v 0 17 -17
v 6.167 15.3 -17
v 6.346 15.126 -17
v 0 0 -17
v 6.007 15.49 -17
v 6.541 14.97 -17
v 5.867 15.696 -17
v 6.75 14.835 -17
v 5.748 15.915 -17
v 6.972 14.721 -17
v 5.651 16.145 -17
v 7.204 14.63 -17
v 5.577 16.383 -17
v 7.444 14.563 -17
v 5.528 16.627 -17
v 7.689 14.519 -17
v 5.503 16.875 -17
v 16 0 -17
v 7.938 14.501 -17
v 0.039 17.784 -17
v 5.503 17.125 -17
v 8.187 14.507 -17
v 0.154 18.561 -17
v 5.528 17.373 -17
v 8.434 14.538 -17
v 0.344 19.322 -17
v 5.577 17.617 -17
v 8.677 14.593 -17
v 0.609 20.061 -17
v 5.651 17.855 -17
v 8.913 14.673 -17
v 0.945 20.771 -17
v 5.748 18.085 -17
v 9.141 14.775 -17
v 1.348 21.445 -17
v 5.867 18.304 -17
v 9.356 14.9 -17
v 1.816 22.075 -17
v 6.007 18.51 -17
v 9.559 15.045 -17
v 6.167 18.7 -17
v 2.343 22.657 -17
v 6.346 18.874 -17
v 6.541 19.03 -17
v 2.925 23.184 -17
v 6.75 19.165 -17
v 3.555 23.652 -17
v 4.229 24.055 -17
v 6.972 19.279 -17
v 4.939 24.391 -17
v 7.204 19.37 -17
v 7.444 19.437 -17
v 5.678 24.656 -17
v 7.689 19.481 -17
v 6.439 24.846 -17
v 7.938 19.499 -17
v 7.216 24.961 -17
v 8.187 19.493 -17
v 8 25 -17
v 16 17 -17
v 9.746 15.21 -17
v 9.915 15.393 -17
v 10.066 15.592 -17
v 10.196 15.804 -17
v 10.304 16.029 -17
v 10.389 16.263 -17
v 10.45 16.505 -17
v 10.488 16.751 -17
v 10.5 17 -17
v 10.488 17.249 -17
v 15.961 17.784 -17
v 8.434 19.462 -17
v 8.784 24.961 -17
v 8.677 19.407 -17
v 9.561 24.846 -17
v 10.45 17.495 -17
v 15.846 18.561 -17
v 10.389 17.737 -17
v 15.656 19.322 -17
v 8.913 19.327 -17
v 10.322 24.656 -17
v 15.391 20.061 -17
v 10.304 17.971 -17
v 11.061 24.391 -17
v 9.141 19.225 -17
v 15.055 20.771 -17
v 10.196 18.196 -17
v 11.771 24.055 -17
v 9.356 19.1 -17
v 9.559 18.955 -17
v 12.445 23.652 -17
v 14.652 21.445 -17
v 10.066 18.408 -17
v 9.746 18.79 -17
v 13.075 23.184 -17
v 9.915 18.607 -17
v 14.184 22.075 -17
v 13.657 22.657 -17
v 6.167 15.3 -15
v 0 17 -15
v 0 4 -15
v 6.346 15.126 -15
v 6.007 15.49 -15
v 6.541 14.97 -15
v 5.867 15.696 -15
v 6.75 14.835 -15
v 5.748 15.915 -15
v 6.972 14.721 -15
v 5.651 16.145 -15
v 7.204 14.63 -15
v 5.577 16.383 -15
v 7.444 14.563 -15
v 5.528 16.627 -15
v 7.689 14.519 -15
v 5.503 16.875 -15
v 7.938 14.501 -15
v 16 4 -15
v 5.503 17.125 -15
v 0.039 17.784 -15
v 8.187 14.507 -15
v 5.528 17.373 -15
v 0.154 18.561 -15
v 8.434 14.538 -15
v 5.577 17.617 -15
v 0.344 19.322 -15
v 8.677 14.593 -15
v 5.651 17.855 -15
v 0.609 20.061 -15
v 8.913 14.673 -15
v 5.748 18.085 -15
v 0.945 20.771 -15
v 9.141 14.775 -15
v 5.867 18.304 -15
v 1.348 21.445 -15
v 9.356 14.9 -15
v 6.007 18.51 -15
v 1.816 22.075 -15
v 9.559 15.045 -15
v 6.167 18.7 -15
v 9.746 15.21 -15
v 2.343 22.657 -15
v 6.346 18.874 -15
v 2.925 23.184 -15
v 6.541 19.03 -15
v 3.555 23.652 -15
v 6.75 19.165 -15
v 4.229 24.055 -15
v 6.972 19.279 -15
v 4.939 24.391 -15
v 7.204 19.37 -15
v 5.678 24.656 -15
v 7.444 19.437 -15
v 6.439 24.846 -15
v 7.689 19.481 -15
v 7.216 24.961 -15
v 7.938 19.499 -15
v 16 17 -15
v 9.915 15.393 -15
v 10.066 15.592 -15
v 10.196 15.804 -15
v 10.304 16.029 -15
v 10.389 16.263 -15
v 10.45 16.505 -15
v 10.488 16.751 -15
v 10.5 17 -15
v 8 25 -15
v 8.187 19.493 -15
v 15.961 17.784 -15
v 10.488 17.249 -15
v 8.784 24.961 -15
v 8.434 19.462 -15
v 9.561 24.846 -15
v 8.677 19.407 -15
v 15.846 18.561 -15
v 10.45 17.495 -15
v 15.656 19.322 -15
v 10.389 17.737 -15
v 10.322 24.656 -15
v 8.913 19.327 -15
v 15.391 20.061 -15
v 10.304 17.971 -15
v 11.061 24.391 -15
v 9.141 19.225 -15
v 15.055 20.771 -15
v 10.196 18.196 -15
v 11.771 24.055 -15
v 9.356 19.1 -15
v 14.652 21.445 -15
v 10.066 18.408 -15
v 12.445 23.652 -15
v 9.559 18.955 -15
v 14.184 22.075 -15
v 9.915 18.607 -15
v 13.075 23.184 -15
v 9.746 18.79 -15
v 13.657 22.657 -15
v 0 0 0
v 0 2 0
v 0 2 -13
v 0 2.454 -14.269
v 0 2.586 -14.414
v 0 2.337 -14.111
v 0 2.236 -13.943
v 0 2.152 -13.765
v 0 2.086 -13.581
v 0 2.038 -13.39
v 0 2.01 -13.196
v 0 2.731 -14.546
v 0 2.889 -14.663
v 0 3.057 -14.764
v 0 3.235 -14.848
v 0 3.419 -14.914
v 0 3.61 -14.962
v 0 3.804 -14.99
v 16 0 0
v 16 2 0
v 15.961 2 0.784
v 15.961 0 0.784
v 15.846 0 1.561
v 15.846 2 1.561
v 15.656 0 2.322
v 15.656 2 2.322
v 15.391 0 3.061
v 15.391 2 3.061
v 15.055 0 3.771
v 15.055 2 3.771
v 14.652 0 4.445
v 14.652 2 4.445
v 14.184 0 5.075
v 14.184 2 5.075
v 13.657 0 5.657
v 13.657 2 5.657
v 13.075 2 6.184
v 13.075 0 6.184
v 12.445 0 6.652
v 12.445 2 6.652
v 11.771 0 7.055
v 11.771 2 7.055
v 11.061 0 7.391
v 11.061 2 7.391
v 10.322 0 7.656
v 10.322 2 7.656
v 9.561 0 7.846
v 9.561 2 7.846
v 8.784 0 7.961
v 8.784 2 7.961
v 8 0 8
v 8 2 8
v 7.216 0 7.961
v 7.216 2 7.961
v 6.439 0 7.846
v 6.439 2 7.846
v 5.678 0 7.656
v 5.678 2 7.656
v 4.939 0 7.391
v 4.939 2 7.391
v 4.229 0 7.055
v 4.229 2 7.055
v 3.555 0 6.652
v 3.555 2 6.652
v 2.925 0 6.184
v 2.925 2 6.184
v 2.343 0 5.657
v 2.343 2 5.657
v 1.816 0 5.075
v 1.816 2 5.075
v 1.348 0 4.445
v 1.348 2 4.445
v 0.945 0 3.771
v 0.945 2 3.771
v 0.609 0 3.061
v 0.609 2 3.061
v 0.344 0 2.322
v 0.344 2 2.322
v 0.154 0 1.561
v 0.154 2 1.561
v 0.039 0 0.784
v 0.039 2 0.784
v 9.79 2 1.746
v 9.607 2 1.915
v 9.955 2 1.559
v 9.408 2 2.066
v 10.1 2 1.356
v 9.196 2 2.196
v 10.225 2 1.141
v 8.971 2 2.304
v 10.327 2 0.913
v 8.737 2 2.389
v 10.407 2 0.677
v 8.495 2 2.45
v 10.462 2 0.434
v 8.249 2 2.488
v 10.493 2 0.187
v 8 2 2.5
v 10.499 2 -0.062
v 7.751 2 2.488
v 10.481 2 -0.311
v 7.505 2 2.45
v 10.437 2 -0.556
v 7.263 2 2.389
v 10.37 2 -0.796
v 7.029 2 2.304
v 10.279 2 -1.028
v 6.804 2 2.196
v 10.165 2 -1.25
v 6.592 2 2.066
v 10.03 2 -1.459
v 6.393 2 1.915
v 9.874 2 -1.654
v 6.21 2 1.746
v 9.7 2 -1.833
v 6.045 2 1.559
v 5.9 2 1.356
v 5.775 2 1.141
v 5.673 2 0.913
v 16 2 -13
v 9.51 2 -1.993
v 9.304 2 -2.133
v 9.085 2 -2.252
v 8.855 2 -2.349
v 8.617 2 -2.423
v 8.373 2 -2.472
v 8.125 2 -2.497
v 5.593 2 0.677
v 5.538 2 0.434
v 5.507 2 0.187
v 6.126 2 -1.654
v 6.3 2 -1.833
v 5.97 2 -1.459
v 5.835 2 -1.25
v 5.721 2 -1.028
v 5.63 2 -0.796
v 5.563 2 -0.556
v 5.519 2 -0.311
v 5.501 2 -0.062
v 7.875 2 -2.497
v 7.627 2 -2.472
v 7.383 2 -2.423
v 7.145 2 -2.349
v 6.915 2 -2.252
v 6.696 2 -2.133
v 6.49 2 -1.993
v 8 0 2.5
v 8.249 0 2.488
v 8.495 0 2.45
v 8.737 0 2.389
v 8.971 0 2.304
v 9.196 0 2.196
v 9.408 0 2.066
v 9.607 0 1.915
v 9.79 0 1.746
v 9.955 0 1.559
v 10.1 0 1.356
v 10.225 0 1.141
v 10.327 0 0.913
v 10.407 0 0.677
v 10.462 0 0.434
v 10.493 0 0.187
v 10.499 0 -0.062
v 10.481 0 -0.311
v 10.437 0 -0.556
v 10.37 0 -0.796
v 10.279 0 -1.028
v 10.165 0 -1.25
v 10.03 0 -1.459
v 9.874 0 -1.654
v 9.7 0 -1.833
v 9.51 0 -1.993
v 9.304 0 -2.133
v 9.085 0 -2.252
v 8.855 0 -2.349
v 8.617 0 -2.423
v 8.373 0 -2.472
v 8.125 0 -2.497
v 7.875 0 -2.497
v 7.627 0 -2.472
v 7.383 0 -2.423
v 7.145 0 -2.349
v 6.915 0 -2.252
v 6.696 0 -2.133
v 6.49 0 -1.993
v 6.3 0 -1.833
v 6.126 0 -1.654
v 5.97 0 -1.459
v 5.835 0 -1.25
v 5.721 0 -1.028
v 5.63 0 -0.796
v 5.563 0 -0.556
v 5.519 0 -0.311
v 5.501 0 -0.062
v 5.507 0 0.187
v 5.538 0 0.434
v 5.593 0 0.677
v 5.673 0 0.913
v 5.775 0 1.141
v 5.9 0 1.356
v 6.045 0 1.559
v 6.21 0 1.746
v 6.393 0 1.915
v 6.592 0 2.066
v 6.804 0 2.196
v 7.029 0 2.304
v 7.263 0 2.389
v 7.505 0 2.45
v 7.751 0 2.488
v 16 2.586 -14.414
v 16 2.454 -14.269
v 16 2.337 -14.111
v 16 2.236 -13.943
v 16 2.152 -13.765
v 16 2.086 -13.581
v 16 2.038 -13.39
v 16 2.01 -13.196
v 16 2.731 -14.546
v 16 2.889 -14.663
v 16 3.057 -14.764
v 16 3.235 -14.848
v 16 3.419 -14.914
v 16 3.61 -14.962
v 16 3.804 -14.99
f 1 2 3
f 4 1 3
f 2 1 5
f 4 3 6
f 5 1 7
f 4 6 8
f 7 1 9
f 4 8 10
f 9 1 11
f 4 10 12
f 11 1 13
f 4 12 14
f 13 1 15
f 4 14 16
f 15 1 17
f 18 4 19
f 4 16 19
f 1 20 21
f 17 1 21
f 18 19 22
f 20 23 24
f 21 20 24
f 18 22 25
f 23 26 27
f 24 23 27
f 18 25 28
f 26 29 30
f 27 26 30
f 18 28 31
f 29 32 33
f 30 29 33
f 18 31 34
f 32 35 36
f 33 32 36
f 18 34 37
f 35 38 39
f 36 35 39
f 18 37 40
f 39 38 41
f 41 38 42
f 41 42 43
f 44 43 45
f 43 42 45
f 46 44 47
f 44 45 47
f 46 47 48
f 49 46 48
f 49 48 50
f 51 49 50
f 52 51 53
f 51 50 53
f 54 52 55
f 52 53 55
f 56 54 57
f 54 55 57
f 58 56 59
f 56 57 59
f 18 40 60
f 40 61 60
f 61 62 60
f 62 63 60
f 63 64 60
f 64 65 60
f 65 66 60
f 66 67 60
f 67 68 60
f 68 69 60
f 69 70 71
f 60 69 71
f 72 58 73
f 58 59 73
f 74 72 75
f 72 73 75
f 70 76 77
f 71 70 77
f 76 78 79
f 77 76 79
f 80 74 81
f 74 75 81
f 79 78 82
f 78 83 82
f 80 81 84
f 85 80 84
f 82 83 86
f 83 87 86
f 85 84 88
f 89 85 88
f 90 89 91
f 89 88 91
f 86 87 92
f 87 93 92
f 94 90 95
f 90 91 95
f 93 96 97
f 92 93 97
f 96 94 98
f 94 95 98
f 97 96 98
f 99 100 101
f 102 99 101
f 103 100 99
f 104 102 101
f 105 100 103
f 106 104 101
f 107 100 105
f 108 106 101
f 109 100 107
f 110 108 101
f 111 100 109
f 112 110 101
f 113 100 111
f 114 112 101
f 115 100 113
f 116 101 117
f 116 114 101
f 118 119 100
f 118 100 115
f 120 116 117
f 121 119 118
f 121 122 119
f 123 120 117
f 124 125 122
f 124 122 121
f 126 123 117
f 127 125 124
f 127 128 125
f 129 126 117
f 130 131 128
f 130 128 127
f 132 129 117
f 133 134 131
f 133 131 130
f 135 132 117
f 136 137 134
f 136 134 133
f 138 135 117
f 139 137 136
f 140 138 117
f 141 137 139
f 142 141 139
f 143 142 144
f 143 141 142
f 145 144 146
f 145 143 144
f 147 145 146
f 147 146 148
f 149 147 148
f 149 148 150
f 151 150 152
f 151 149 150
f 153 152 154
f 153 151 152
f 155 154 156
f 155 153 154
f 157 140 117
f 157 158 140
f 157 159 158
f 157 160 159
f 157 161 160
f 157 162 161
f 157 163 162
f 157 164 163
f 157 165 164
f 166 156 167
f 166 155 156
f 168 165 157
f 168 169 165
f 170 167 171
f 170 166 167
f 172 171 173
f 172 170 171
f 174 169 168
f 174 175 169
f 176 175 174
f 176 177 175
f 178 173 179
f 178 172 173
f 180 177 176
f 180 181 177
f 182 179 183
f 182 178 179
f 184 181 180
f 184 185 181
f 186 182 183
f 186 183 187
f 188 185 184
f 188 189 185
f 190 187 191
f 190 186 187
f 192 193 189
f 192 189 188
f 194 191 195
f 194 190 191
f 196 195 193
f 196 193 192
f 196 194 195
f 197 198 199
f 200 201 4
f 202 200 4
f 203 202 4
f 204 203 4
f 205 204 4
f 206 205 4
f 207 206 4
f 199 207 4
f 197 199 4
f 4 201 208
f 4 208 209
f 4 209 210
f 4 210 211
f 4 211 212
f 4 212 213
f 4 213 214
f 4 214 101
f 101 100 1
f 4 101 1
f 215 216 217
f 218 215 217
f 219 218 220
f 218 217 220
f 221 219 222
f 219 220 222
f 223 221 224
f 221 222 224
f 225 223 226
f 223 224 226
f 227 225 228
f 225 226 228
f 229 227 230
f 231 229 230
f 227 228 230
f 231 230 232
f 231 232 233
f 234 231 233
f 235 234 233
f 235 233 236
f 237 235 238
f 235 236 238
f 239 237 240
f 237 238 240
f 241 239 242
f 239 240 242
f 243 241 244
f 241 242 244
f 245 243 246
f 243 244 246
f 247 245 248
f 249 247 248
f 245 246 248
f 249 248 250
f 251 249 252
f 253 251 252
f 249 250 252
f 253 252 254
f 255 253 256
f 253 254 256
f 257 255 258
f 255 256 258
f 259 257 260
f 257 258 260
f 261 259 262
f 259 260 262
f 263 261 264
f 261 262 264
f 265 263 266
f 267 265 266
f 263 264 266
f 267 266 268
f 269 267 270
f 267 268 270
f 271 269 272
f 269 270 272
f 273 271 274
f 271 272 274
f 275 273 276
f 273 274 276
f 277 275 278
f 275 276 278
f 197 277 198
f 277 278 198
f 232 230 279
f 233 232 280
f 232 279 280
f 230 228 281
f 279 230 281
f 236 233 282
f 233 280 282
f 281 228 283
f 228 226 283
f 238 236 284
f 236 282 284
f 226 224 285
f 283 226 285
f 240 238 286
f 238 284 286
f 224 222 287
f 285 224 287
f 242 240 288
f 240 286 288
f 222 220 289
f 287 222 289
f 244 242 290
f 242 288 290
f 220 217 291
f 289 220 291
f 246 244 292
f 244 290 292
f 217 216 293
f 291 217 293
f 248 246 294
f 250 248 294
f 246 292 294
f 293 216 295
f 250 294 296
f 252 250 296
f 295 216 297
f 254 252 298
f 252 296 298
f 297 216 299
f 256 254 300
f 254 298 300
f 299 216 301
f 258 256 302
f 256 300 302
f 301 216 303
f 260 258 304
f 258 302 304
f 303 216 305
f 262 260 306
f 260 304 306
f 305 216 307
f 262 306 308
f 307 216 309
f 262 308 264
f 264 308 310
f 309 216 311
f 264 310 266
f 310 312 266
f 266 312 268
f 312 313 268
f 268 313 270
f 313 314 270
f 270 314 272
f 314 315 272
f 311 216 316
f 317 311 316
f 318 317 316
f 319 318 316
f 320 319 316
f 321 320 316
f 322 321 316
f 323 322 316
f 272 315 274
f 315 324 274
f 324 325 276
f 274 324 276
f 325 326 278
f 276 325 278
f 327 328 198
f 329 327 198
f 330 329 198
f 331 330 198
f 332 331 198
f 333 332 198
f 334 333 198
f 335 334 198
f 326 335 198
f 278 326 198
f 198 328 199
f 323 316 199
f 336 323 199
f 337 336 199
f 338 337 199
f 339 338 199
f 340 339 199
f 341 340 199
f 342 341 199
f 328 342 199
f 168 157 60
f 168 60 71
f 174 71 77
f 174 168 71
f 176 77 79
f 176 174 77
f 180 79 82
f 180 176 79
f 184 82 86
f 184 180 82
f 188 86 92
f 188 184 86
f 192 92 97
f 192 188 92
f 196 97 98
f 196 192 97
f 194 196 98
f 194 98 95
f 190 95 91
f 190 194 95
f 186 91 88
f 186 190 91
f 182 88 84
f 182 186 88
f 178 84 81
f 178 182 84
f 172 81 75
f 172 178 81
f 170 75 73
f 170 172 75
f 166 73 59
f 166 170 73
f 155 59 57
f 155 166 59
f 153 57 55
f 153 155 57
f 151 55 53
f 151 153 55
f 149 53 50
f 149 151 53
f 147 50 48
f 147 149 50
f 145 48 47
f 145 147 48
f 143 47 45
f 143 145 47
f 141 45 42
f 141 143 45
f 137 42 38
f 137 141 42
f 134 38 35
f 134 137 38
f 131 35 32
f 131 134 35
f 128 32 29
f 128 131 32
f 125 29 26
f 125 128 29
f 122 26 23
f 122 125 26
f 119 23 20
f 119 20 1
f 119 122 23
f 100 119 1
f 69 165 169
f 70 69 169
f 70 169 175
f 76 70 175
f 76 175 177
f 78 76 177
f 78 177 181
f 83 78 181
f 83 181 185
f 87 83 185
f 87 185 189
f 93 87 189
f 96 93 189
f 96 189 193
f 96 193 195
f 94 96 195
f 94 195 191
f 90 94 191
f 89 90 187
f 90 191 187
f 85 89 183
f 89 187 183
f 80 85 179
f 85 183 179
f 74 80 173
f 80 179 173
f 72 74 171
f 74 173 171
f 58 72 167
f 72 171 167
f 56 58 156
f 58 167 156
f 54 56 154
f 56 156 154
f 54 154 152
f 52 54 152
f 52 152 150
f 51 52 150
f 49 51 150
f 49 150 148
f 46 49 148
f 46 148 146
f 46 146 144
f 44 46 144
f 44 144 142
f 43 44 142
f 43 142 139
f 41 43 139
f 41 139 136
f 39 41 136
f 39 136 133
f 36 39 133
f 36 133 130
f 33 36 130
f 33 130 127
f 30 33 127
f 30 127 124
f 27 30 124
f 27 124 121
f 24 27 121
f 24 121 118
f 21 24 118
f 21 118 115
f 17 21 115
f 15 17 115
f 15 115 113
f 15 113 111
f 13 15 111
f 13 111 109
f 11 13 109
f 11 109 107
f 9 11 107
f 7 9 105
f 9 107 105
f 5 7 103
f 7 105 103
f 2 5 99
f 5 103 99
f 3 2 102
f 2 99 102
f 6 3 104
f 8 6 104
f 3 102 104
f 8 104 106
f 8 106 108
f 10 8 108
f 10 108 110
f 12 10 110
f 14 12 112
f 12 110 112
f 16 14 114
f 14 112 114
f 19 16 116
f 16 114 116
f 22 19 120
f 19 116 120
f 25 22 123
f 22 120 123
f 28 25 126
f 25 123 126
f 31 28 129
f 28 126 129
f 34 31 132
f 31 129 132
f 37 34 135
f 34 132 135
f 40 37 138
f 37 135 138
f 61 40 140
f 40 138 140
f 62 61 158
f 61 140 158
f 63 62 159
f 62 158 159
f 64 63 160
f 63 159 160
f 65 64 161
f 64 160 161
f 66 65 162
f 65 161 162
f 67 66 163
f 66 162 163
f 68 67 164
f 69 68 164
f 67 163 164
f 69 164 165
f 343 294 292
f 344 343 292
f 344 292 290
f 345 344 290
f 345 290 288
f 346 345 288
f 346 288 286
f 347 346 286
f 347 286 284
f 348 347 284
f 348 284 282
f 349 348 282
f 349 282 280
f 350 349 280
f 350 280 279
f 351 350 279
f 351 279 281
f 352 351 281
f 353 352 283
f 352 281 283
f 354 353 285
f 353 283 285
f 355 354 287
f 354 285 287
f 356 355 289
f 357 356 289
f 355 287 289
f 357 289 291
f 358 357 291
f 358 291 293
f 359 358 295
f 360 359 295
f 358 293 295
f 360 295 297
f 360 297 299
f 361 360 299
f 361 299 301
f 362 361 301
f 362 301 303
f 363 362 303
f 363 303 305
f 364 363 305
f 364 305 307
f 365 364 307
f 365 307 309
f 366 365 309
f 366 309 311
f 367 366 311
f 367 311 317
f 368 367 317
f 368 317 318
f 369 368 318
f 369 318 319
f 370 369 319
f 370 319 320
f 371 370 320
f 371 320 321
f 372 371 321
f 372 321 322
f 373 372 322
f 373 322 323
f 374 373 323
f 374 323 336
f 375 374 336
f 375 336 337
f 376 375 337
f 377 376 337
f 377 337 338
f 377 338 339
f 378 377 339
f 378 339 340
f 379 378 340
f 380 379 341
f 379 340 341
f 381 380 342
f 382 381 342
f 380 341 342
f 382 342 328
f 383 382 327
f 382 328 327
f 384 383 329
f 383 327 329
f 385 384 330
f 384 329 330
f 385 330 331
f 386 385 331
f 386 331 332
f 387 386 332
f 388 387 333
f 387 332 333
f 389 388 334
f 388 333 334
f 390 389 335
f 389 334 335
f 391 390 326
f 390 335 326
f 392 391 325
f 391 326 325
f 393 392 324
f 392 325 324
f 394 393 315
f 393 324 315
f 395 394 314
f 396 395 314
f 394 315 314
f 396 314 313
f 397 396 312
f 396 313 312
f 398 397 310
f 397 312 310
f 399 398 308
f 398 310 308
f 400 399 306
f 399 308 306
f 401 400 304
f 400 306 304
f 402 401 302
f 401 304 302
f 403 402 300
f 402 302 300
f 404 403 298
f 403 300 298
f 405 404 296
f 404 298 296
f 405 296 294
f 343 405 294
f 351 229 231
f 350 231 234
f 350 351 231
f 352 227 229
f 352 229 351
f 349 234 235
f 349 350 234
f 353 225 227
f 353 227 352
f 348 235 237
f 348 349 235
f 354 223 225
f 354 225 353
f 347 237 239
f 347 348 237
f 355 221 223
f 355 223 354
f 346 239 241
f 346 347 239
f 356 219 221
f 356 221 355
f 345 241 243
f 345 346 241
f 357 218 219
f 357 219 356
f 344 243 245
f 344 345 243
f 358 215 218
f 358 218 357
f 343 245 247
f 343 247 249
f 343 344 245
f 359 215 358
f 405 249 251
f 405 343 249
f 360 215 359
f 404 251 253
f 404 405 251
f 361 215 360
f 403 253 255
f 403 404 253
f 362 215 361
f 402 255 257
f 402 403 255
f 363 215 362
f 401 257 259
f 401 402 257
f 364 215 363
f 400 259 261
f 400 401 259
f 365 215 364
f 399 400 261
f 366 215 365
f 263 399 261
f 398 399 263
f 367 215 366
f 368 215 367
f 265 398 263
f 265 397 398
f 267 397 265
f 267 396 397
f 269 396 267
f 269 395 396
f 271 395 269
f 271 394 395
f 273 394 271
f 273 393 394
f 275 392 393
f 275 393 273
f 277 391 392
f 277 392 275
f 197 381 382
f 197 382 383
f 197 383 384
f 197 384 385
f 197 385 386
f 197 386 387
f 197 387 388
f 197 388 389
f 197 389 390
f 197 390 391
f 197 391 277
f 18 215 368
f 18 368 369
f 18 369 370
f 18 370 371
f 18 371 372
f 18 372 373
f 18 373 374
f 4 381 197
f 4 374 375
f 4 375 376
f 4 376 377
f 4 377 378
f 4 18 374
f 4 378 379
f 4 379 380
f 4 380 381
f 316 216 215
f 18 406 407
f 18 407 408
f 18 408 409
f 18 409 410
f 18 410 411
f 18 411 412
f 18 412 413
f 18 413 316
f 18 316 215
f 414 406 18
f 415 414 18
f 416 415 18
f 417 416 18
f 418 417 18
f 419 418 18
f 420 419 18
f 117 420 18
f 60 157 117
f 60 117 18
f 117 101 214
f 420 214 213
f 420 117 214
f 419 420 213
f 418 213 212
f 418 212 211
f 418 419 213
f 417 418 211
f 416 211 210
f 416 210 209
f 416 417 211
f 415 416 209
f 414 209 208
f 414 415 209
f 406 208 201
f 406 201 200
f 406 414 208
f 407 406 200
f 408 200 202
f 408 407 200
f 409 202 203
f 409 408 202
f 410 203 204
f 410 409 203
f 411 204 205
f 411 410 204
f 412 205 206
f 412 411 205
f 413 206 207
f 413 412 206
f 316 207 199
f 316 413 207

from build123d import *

# Parameters (mm, degrees)
EXTRUDE_1_DEPTH     = 16
EXTRUDE_2_DEPTH     = 2
FILLET_1_R          = 2
EXTRUDE_3_DEPTH     = 2
SKETCH_4_R          = 2.5
CUT_EXTRUDE_1_DEPTH = 16
SKETCH_5_R          = 2.5
CUT_EXTRUDE_2_DEPTH = 16


with BuildPart() as part:
    # 草图1 → 凸台-拉伸1 (new body)
    with BuildSketch(Plane(origin=(0, 0, 0), x_dir=(0, 0, -1), z_dir=(1, 0, 0))):
        Polygon((0, 0), (17, 0), (17, 17), (15, 17), (15, 2), (0, 2), align=None)
    extrude(amount=EXTRUDE_1_DEPTH)

    # 草图2 → 凸台-拉伸2 (add)
    with BuildSketch(Plane.XY.offset(-15)):
        with BuildLine():
            Line((0, 17), (16, 17))
            ThreePointArc((16, 17), (8, 25), (0, 17))
        make_face()
    extrude(amount=-EXTRUDE_2_DEPTH)

    # 圆角1
    fillet_1_edges = [part.edges().sort_by_distance(p)[0] for p in [
        (8, 2, -15),
    ]]
    fillet(fillet_1_edges, radius=FILLET_1_R)

    # 草图3 → 凸台-拉伸3 (add)
    with BuildSketch(Plane(origin=(0, 2, 0), x_dir=(1, 0, 0), z_dir=(0, 1, 0))):
        with BuildLine():
            Line((0, 0), (16, 0))
            ThreePointArc((16, 0), (8, -8), (0, 0))
        make_face()
    extrude(amount=-EXTRUDE_3_DEPTH)

    # 草图4 → 切除-拉伸1 (cut)
    with BuildSketch(Plane.XY.offset(-15)):
        with Locations((8, 17)):
            Circle(SKETCH_4_R)
    extrude(amount=-CUT_EXTRUDE_1_DEPTH, mode=Mode.SUBTRACT)

    # 草图5 → 切除-拉伸2 (cut)
    with BuildSketch(Plane(origin=(0, 2, 0), x_dir=(1, 0, 0), z_dir=(0, 1, 0))):
        with Locations(Location((8, 0, 0), (0, 0, 270))):
            Circle(SKETCH_5_R)
    extrude(amount=-CUT_EXTRUDE_2_DEPTH, mode=Mode.SUBTRACT)


solid = part.part
